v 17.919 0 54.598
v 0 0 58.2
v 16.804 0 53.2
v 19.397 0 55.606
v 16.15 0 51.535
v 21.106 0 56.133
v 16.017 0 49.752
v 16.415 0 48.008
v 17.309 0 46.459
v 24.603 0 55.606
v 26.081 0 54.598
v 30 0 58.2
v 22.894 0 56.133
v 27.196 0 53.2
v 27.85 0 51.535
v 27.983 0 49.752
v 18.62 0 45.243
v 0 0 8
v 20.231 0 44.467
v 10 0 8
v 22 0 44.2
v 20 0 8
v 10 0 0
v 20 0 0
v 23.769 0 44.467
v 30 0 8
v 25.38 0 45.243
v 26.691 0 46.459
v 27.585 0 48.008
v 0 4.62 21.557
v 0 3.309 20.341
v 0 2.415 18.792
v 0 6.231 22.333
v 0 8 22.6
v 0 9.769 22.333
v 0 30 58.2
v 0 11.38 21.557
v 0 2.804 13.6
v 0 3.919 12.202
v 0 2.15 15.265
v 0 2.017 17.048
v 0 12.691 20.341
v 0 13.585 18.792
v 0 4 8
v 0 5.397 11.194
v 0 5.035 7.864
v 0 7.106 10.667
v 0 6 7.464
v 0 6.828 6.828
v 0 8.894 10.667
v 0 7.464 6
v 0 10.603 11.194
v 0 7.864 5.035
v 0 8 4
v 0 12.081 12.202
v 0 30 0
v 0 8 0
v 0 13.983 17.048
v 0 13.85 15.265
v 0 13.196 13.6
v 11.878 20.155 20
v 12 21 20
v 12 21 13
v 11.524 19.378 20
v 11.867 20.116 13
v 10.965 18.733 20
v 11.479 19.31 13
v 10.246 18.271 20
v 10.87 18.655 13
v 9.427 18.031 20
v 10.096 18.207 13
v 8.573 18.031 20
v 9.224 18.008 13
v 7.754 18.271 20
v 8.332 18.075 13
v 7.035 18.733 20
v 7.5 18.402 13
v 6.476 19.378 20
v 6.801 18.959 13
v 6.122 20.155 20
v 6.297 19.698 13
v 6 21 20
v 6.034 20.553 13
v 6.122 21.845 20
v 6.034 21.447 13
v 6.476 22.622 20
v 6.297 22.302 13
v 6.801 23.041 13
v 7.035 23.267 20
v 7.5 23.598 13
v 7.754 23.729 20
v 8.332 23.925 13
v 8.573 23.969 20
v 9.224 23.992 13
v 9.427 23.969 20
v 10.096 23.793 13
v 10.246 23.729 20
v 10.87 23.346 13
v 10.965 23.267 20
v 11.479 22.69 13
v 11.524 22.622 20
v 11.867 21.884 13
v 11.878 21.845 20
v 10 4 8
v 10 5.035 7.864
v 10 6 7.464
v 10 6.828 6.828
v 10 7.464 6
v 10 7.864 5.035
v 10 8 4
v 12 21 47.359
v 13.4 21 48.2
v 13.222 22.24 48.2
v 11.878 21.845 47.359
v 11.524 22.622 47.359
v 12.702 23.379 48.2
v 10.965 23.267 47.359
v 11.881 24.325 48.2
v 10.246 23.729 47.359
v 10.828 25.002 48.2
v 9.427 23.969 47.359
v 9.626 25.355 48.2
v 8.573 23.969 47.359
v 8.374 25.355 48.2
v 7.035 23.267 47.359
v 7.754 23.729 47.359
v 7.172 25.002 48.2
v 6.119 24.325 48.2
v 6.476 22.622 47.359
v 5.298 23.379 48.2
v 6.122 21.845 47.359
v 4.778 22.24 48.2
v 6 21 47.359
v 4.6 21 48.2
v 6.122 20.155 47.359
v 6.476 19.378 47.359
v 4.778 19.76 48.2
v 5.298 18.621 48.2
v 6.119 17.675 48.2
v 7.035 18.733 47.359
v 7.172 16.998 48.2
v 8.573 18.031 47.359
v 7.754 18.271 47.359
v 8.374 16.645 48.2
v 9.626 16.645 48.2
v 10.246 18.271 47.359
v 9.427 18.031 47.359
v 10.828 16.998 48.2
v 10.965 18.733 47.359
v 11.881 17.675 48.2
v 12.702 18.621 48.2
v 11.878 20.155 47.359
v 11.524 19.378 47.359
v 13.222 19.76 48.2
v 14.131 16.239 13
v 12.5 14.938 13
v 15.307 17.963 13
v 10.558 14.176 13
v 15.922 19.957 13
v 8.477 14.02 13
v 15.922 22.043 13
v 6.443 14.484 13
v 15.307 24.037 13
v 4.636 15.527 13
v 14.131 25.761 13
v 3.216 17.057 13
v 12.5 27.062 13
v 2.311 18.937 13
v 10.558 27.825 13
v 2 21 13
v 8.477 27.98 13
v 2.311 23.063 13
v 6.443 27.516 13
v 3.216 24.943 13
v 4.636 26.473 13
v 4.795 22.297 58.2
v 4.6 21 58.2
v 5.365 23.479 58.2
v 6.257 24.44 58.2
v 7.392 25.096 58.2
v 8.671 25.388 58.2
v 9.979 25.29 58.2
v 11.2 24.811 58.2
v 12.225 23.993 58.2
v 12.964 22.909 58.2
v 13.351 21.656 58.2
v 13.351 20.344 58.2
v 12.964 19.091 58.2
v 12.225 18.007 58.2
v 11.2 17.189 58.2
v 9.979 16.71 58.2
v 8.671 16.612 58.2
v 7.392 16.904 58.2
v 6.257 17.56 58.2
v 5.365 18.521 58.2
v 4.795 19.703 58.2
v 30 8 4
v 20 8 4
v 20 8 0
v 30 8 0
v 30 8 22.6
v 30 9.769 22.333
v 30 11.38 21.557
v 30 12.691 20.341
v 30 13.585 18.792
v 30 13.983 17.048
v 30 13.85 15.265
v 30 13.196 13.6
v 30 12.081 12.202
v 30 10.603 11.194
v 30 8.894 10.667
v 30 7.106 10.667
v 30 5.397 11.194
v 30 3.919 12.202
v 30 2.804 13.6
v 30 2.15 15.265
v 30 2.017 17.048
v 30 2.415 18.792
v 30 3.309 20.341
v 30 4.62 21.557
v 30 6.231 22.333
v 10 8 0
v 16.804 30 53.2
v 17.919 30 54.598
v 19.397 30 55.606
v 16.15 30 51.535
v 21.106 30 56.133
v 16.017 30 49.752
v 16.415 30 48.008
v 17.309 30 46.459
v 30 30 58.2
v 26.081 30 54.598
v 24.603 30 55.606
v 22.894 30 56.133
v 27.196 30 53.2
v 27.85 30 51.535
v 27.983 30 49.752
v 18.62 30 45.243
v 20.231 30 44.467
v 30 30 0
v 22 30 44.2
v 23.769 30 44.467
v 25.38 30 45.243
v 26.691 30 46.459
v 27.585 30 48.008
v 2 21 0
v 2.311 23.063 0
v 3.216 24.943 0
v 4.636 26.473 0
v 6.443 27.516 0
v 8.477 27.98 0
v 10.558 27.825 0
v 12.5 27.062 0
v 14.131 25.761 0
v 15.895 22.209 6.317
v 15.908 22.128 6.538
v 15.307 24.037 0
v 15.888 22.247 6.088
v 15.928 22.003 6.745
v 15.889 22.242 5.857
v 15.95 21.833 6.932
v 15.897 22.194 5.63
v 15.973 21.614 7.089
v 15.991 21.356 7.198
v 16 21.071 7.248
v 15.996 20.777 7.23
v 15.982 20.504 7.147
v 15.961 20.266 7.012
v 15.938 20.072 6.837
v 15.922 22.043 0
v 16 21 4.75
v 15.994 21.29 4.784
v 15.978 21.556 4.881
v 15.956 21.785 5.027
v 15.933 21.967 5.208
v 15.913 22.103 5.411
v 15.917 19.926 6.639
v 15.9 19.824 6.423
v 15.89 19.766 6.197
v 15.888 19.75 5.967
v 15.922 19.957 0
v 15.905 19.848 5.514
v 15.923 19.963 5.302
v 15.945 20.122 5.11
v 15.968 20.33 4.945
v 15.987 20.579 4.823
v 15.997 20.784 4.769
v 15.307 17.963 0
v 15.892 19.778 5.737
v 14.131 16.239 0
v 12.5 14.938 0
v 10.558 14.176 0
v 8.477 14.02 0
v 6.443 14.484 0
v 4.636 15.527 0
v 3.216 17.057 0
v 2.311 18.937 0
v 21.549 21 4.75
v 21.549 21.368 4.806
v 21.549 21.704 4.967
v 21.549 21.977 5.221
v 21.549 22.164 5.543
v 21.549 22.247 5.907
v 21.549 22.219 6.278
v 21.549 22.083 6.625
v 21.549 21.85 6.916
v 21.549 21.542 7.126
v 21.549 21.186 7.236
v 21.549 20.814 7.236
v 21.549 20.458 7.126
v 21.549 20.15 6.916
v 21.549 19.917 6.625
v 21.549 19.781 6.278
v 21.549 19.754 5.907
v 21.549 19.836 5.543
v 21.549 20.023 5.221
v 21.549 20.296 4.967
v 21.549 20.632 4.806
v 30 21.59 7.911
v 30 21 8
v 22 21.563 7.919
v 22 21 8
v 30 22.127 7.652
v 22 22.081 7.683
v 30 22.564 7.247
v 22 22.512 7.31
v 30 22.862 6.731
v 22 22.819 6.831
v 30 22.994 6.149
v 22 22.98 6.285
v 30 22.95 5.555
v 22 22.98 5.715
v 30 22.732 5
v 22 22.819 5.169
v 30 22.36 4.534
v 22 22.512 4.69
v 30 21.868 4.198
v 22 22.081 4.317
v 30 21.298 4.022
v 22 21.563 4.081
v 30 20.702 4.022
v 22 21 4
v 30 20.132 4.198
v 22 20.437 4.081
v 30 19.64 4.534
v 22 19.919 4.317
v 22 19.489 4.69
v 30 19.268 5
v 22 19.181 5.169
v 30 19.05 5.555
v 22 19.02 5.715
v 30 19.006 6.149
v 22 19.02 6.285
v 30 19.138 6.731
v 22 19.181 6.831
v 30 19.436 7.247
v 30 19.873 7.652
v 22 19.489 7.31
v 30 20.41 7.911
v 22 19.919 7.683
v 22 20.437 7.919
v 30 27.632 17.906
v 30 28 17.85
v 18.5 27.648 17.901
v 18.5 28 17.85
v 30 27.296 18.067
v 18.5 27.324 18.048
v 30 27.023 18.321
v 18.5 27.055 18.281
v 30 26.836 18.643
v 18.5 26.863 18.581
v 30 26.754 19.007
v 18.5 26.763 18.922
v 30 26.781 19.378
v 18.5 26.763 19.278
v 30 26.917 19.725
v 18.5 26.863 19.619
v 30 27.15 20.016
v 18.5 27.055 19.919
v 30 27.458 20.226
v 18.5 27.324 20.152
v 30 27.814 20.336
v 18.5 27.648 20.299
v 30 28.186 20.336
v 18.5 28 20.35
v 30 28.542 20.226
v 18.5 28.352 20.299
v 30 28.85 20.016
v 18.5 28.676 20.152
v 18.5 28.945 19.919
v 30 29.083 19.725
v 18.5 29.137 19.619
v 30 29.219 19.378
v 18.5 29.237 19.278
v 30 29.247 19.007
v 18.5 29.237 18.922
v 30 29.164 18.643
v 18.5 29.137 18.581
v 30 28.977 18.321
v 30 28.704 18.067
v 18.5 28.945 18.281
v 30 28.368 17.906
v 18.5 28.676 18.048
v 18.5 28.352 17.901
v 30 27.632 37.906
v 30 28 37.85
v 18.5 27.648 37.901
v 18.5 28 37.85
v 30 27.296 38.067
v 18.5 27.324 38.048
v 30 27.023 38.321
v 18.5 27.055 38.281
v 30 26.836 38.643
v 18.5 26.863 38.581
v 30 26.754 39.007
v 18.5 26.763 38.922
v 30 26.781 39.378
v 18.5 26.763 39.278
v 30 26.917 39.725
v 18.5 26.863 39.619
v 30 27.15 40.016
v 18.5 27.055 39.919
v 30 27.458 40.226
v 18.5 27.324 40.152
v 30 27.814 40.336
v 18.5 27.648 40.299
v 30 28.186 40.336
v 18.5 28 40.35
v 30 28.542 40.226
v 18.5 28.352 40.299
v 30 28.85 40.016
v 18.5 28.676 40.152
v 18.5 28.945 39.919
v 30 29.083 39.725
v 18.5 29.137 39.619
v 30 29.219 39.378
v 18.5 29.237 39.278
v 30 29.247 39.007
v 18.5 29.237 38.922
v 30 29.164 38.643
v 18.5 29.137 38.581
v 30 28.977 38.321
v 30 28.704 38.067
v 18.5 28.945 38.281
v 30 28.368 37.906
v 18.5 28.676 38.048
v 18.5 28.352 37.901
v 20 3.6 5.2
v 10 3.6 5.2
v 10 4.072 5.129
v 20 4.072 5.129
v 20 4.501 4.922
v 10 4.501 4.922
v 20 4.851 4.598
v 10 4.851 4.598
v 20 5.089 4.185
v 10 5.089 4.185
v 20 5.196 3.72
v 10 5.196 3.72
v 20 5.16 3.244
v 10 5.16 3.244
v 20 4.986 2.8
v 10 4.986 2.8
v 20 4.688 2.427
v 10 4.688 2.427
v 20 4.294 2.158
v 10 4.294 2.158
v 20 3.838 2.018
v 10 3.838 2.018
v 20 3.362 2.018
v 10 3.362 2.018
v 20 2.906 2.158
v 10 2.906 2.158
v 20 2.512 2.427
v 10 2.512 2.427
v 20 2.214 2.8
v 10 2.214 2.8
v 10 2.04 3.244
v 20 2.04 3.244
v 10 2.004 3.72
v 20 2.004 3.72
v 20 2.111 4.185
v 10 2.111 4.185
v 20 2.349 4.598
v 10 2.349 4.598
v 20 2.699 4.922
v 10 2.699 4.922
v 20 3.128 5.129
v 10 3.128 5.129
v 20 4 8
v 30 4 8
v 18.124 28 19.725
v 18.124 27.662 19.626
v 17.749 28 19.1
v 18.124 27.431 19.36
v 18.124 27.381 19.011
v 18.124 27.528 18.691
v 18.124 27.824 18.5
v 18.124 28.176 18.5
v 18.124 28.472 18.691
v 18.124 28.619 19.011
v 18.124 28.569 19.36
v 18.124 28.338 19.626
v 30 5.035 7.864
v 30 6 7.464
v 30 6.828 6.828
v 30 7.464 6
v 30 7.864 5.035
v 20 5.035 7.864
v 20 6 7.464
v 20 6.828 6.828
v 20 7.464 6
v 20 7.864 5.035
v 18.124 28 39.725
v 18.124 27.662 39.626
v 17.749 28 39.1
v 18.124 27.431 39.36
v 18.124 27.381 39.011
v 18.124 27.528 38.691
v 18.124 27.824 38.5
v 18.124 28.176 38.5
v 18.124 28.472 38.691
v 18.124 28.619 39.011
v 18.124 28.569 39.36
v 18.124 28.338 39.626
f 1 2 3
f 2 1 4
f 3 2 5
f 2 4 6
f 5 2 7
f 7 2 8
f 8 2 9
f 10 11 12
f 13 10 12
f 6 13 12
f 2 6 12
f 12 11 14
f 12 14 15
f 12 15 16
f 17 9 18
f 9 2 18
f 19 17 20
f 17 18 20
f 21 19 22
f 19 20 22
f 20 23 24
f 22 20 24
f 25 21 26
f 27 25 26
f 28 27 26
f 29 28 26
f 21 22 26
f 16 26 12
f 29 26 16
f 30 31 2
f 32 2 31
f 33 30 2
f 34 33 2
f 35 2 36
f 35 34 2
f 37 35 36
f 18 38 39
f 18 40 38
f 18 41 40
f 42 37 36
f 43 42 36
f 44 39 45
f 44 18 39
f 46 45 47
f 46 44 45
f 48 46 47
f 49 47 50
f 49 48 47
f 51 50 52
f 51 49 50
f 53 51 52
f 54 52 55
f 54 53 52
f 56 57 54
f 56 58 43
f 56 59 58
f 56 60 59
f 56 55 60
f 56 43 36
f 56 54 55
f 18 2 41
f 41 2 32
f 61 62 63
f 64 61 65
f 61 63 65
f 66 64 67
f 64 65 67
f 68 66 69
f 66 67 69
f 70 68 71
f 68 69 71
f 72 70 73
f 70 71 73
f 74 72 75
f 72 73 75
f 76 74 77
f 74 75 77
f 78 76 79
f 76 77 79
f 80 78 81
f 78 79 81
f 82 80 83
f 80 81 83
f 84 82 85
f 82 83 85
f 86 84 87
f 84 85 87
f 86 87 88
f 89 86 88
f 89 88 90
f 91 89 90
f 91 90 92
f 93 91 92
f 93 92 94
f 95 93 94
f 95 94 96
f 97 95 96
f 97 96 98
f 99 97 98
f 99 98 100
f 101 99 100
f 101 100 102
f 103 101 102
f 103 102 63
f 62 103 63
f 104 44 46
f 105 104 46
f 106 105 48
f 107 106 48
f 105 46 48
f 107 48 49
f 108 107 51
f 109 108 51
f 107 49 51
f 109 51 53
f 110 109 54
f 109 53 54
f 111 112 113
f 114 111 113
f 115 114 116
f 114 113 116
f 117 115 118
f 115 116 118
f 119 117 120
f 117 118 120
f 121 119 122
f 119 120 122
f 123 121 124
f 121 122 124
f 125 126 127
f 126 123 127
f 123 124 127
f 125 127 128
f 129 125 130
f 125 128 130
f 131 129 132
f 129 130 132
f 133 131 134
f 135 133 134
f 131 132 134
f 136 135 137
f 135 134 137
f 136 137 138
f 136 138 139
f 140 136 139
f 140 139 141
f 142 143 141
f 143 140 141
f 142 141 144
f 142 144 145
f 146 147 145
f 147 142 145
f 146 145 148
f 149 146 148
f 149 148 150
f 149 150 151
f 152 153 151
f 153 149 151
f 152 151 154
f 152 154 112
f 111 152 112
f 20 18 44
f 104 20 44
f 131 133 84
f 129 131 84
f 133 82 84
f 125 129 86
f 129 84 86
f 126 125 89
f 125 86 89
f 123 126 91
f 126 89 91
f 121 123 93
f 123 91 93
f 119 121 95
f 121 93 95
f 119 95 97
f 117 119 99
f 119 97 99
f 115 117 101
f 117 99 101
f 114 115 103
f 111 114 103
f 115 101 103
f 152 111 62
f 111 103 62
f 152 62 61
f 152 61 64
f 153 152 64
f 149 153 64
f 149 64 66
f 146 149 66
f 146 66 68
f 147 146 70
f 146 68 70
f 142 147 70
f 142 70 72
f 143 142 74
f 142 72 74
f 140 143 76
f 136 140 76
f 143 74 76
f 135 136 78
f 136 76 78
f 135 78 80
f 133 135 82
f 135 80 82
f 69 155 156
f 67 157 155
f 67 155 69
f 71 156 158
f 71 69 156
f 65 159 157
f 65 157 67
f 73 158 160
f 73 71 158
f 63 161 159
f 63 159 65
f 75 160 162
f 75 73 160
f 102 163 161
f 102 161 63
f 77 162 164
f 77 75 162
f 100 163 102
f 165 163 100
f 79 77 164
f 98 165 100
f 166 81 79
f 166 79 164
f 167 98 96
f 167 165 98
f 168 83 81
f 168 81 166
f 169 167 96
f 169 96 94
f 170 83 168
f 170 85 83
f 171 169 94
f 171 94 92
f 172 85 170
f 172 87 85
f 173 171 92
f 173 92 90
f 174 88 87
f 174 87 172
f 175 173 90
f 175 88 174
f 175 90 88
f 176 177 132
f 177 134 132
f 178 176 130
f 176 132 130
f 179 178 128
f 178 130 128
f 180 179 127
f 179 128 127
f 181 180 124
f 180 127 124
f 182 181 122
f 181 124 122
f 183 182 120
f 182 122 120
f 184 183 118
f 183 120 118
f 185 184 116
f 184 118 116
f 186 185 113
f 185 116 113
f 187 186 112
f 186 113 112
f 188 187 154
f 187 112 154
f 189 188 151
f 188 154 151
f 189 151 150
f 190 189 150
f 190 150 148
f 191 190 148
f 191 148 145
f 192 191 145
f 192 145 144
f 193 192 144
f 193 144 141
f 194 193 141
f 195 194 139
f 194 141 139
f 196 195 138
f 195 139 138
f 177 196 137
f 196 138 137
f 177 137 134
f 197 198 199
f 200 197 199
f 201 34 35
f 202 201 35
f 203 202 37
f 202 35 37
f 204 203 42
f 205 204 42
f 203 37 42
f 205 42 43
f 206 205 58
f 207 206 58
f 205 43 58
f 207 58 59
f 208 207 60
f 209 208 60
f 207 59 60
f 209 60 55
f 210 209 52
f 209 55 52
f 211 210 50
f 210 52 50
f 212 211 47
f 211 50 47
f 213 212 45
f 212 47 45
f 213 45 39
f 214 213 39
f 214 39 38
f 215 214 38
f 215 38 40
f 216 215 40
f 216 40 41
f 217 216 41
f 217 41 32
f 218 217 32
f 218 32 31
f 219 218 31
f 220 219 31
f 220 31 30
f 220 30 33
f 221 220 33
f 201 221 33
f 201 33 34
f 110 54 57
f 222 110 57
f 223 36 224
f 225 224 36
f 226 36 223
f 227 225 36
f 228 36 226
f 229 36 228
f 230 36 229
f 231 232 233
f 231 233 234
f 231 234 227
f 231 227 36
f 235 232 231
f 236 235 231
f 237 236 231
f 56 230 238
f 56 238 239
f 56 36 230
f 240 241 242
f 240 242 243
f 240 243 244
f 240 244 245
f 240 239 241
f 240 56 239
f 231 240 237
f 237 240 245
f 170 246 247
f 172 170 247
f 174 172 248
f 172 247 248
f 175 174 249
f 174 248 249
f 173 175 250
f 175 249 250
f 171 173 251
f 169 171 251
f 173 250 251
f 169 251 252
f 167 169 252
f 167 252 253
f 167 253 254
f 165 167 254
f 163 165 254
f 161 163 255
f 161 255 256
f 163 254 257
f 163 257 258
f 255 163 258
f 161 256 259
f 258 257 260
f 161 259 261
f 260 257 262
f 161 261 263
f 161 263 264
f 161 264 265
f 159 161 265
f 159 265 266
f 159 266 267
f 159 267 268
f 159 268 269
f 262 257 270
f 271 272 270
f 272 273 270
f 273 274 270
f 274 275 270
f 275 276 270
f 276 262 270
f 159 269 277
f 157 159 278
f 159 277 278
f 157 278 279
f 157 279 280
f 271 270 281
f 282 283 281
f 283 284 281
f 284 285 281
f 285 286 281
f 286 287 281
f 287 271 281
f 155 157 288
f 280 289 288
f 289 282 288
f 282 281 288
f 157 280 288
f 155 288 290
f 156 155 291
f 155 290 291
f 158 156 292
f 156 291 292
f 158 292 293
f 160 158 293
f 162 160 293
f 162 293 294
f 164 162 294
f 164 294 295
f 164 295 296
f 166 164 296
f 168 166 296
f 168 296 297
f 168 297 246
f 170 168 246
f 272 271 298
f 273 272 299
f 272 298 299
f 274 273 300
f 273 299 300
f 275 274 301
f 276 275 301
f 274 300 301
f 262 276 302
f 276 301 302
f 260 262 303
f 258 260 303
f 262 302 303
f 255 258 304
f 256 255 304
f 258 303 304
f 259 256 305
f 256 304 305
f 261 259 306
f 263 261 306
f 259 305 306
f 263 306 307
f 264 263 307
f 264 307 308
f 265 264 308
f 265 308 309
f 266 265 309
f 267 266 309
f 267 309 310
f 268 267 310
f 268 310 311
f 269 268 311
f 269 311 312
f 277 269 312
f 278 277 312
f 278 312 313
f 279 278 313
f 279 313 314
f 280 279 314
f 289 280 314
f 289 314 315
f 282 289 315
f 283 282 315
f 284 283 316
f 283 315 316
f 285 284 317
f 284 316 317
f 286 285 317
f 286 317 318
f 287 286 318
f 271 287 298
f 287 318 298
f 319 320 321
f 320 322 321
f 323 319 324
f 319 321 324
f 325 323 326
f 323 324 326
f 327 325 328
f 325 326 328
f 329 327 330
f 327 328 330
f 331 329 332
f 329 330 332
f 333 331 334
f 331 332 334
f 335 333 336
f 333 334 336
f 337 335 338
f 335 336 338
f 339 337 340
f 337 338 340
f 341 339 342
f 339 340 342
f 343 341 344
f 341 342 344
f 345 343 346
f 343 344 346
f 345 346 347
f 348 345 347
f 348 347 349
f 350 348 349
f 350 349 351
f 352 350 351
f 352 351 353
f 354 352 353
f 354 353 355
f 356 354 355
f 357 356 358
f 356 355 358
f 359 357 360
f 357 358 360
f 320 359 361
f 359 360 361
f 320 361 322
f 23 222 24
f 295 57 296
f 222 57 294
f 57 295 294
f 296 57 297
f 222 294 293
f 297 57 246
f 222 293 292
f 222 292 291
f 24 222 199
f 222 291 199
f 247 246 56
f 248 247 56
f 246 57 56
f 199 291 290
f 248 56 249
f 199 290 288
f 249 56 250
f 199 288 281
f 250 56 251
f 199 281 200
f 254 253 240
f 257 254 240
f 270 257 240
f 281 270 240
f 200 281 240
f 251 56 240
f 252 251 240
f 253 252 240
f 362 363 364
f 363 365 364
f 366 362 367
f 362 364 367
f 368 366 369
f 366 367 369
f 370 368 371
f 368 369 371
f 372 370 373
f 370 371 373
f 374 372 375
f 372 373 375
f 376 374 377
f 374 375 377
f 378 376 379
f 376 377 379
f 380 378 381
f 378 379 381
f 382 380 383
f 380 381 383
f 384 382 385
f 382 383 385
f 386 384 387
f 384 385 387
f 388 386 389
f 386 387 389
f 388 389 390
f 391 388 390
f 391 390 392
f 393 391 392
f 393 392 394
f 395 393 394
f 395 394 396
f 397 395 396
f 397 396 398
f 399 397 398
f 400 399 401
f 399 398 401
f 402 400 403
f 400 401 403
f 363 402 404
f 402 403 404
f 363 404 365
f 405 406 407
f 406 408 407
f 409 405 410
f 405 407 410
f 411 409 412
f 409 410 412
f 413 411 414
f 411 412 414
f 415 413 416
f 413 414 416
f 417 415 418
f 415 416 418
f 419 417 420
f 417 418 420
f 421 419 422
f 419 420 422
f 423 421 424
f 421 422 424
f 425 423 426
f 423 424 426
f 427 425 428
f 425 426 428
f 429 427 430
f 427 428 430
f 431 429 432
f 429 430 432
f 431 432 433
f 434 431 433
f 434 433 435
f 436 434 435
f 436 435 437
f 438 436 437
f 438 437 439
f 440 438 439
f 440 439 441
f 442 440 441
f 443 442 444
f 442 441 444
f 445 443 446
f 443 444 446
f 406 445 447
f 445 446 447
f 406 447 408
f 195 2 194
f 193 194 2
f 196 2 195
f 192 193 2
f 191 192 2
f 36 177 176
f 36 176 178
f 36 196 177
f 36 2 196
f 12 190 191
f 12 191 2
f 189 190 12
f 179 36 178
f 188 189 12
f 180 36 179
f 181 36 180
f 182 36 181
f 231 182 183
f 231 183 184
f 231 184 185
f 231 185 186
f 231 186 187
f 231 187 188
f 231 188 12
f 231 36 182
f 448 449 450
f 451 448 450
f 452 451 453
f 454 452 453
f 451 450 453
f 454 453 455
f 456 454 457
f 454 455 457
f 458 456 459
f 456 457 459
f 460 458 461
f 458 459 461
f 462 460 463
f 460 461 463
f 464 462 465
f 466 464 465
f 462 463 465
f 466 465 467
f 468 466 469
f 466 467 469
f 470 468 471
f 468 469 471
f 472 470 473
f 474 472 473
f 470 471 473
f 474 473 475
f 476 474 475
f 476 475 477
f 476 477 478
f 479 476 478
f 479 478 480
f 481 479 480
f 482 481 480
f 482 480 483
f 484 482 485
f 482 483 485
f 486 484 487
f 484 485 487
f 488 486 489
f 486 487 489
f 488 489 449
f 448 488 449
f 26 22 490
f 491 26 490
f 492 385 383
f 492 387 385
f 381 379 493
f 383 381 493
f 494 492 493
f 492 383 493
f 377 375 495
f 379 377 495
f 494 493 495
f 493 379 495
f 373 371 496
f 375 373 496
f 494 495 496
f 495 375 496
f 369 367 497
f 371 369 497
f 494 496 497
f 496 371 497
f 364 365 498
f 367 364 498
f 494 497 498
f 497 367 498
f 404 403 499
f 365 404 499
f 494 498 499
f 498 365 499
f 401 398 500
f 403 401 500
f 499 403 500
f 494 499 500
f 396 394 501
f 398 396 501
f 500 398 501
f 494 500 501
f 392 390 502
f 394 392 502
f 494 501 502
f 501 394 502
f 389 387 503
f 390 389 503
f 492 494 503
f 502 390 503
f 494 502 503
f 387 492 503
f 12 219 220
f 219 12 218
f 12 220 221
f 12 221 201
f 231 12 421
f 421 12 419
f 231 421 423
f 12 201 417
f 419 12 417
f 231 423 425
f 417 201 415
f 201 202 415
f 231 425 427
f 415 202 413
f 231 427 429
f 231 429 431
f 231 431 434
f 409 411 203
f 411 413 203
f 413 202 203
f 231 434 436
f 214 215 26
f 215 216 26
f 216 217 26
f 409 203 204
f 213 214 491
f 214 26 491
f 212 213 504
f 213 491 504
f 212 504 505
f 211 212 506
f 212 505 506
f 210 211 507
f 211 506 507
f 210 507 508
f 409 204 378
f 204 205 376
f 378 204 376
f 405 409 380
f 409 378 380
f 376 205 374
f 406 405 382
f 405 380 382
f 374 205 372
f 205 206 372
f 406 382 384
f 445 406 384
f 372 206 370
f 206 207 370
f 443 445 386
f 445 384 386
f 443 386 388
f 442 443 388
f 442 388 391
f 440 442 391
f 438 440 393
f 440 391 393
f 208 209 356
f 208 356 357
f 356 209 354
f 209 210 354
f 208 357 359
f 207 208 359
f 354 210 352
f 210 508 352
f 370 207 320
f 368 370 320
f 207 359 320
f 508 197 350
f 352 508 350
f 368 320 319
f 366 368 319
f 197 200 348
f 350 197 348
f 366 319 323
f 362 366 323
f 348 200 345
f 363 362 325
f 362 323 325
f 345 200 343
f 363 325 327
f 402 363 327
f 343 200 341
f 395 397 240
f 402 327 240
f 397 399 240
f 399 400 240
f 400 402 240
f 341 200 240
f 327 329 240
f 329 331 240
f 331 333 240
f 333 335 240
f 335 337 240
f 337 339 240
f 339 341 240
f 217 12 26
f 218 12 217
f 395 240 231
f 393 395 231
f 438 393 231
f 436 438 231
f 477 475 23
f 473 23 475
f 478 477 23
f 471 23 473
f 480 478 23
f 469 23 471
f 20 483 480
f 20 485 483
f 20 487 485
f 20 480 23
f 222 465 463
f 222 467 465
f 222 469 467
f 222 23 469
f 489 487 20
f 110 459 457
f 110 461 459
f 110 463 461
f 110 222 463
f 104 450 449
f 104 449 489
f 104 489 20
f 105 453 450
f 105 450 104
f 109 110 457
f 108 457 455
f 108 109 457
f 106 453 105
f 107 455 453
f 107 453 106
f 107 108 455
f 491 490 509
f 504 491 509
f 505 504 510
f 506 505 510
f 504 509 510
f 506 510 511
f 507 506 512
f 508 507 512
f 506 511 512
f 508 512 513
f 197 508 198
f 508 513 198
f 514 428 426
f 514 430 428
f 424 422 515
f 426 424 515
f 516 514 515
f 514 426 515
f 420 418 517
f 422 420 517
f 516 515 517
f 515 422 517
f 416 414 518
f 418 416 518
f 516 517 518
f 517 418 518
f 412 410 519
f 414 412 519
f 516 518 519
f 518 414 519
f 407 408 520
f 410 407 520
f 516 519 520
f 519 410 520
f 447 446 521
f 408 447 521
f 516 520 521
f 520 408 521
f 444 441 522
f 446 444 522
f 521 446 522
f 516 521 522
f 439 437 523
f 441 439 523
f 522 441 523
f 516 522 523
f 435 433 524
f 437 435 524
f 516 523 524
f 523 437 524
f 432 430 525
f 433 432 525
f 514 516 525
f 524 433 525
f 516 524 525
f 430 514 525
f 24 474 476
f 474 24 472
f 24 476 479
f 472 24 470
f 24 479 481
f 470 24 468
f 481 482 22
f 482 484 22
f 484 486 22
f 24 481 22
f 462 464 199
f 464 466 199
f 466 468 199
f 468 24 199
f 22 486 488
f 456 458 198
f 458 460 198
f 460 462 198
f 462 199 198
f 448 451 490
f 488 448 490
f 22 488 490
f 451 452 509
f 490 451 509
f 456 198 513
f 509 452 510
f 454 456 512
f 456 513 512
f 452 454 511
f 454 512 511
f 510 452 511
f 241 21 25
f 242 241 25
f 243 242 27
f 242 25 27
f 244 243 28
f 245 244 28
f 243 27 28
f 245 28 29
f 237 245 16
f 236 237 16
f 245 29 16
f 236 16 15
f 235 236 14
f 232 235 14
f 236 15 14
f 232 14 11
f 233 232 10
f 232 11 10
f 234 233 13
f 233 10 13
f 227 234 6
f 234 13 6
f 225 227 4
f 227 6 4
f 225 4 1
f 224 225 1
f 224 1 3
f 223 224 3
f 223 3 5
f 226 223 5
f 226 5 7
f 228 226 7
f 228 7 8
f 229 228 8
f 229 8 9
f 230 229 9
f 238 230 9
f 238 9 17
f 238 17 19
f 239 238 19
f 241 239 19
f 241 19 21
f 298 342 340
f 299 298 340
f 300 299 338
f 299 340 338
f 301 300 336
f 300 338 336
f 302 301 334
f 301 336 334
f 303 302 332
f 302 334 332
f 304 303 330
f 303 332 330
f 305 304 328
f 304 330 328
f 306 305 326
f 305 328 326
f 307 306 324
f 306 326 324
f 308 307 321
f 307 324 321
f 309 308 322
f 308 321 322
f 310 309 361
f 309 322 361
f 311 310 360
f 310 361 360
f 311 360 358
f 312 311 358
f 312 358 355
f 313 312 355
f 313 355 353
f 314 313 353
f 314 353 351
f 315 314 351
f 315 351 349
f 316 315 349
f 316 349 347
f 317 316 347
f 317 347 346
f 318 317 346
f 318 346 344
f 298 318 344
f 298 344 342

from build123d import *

# Parameters (mm, degrees)
SCHIZZO1_W                   = 30.00001
SCHIZZO1_H                   = 30.00001
ESTRUSIONE_ESTRUSIONE1_DEPTH = 58.2
TAGLIO_ESTRUSIONE1_REACH     = 74.023
SCHIZZO2_R                   = 6
TAGLIO_ESTRUSIONE2_REACH     = 74.023
SCHIZZO3_R                   = 6
SCHIZZO5_R                   = 7
TAGLIO_ESTRUSIONE3_DEPTH     = 20
FORO_6_0_6_1_D               = 6
FORO_FILETTATO_G1_8_1_D      = 8.8
FORO_FILETTATO_G1_8_1_DEPTH  = 10
FORO_FILETTATO_G1_8_1_TIP    = 2.643786724
FORO_FILETTATO_M3_1_REACH    = 74.023
FORO_FILETTATO_M3_1_BORE_R   = 1.25
FORO_4_0_4_2_D               = 4
FORO_4_0_4_2_DEPTH           = 8
FORO_4_0_4_2_TIP             = 1.201721238
TAGLIO_ESTRUSIONE5_DEPTH     = 10
TAGLIO_ESTRUSIONE6_START     = -10
TAGLIO_ESTRUSIONE6_DEPTH     = 10
SCHIZZO23_R                  = 1.6
TAGLIO_ESTRUSIONE7_DEPTH     = 10.00001
ESTRUSIONE_ESTRUSIONE2_START = 7
SCHIZZO24_R                  = 7
SCHIZZO24_R_2                = 3
ESTRUSIONE_ESTRUSIONE2_DEPTH = 7
FORO_FILETTATO_M3_2_D        = 2.5
FORO_FILETTATO_M3_2_DEPTH    = 11.5
FORO_FILETTATO_M3_2_TIP      = 0.751075774


with BuildPart() as part:
    # Schizzo1 → Estrusione-Estrusione1 (new body)
    with BuildSketch(Plane.XY):
        with Locations((15.000005, 15.000005)):
            Rectangle(SCHIZZO1_W, SCHIZZO1_H)
    extrude(amount=ESTRUSIONE_ESTRUSIONE1_DEPTH)

    # Schizzo2 → Taglio-Estrusione1 (cut, up to next)
    with BuildSketch(Plane.XZ, mode=Mode.PRIVATE) as taglio_estrusione1_sk1:
        with Locations(Location((22.00001, 50.2, 0), (0, 0, 270))):
            Circle(SCHIZZO2_R)
    taglio_estrusione1_tool1 = extrude(taglio_estrusione1_sk1.sketch, amount=-TAGLIO_ESTRUSIONE1_REACH, mode=Mode.PRIVATE) & part.part
    add(taglio_estrusione1_tool1.solids().sort_by_distance((22.00001, 0, 50.2))[0], mode=Mode.SUBTRACT)

    # Schizzo3 → Taglio-Estrusione2 (cut, up to next)
    with BuildSketch(Plane.ZY, mode=Mode.PRIVATE) as taglio_estrusione2_sk1:
        with Locations((16.6, 8)):
            Circle(SCHIZZO3_R)
    taglio_estrusione2_tool1 = extrude(taglio_estrusione2_sk1.sketch, amount=-TAGLIO_ESTRUSIONE2_REACH, mode=Mode.PRIVATE) & part.part
    add(taglio_estrusione2_tool1.solids().sort_by_distance((0, 8, 16.6))[0], mode=Mode.SUBTRACT)

    # Schizzo5 → Taglio-Estrusione3 (cut)
    with BuildSketch(Plane(origin=(0, 0, 0), x_dir=(-1, 0, 0), z_dir=(0, 0, -1))):
        with Locations((-9, 21.00001)):
            Circle(SCHIZZO5_R)
    extrude(amount=-TAGLIO_ESTRUSIONE3_DEPTH, mode=Mode.SUBTRACT)

    # Foro Ø6.0 (6)-1 (through all)
    with Locations(Plane.XY.offset(58.2)):
        with Locations((9, 21.00001)):
            Hole(FORO_6_0_6_1_D / 2)

    # Foro filettato G1/8-1
    with Locations(Plane(origin=(9, 21.00001, 58.2), x_dir=(1, 0, 0), z_dir=(0, 0, 1))):
        with Locations((0, 0)):
            Hole(FORO_FILETTATO_G1_8_1_D / 2, depth=FORO_FILETTATO_G1_8_1_DEPTH)
            with Locations((0, 0, -(FORO_FILETTATO_G1_8_1_DEPTH + FORO_FILETTATO_G1_8_1_TIP / 2))):  # 118° drill point
                Cone(0, FORO_FILETTATO_G1_8_1_D / 2, FORO_FILETTATO_G1_8_1_TIP, mode=Mode.SUBTRACT)

    # Foro filettato M3-1 bore → Foro filettato M3-1 (cut, up to next)
    with BuildSketch(Plane(origin=(30.00001, 0, 0), x_dir=(0, 0, -1), z_dir=(1, 0, 0)), mode=Mode.PRIVATE) as foro_filettato_m3_1_sk1:
        with Locations((-6, 21.00001)):
            Circle(FORO_FILETTATO_M3_1_BORE_R)
    foro_filettato_m3_1_tool1 = extrude(foro_filettato_m3_1_sk1.sketch, amount=-FORO_FILETTATO_M3_1_REACH, mode=Mode.PRIVATE) & part.part
    add(foro_filettato_m3_1_tool1.solids().sort_by_distance((30.00001, 21.00001, 6))[0], mode=Mode.SUBTRACT)

    # Foro Ø4.0 (4)-2
    with Locations(Plane(origin=(30.00001, 0, 0), x_dir=(0, 0, -1), z_dir=(1, 0, 0))):
        with Locations((-6, 21.00001)):
            Hole(FORO_4_0_4_2_D / 2, depth=FORO_4_0_4_2_DEPTH)
            with Locations((0, 0, -(FORO_4_0_4_2_DEPTH + FORO_4_0_4_2_TIP / 2))):  # 118° drill point
                Cone(0, FORO_4_0_4_2_D / 2, FORO_4_0_4_2_TIP, mode=Mode.SUBTRACT)

    # Schizzo20 → Taglio-Estrusione5 (cut)
    with BuildSketch(Plane.ZY):
        with BuildLine():
            Line((4, 8), (0, 8))
            Line((0, 8), (0, 0))
            Line((0, 0), (8, 0))
            Line((8, 0), (8, 4))
            ThreePointArc((8, 4), (6.828427125, 6.828427125), (4, 8))
        make_face()
    extrude(amount=-TAGLIO_ESTRUSIONE5_DEPTH, mode=Mode.SUBTRACT)

    # Schizzo21 → Taglio-Estrusione6 (cut)
    with BuildSketch(Plane(origin=(30.00001, 0, 0), x_dir=(0, 0, -1), z_dir=(1, 0, 0)).offset(TAGLIO_ESTRUSIONE6_START)):
        with BuildLine():
            Line((-8, 0), (-8, 4))
            ThreePointArc((-8, 4), (-6.828427125, 6.828427125), (-4, 8))
            Line((-4, 8), (0, 8))
            Line((0, 8), (0, 0))
            Line((0, 0), (-8, 0))
        make_face()
    extrude(amount=TAGLIO_ESTRUSIONE6_DEPTH, mode=Mode.SUBTRACT)

    # Schizzo23 → Taglio-Estrusione7 (cut)
    with BuildSketch(Plane.ZY.offset(-10)):
        with Locations((3.6, 3.6)):
            Circle(SCHIZZO23_R)
    extrude(amount=-TAGLIO_ESTRUSIONE7_DEPTH, mode=Mode.SUBTRACT)

    # Schizzo24 → Estrusione-Estrusione2 (add)
    with BuildSketch(Plane(origin=(0, 0, 20), x_dir=(-1, 0, 0), z_dir=(0, 0, -1)).offset(ESTRUSIONE_ESTRUSIONE2_START)):
        with Locations((-9, 21.00001)):
            Circle(SCHIZZO24_R)
        with Locations(Location((-9, 21.00001, 0), (0, 0, 180))):
            Circle(SCHIZZO24_R_2, mode=Mode.SUBTRACT)
    extrude(amount=-ESTRUSIONE_ESTRUSIONE2_DEPTH)

    # Foro filettato M3-2
    with Locations(Plane(origin=(30.00001, 28.00001, 39.1), x_dir=(0, 0, 1), z_dir=(1, 0, 0))):
        with Locations((0, 0), (-20, 0)):
            Hole(FORO_FILETTATO_M3_2_D / 2, depth=FORO_FILETTATO_M3_2_DEPTH)
            with Locations((0, 0, -(FORO_FILETTATO_M3_2_DEPTH + FORO_FILETTATO_M3_2_TIP / 2))):  # 118° drill point
                Cone(0, FORO_FILETTATO_M3_2_D / 2, FORO_FILETTATO_M3_2_TIP, mode=Mode.SUBTRACT)


solid = part.part
